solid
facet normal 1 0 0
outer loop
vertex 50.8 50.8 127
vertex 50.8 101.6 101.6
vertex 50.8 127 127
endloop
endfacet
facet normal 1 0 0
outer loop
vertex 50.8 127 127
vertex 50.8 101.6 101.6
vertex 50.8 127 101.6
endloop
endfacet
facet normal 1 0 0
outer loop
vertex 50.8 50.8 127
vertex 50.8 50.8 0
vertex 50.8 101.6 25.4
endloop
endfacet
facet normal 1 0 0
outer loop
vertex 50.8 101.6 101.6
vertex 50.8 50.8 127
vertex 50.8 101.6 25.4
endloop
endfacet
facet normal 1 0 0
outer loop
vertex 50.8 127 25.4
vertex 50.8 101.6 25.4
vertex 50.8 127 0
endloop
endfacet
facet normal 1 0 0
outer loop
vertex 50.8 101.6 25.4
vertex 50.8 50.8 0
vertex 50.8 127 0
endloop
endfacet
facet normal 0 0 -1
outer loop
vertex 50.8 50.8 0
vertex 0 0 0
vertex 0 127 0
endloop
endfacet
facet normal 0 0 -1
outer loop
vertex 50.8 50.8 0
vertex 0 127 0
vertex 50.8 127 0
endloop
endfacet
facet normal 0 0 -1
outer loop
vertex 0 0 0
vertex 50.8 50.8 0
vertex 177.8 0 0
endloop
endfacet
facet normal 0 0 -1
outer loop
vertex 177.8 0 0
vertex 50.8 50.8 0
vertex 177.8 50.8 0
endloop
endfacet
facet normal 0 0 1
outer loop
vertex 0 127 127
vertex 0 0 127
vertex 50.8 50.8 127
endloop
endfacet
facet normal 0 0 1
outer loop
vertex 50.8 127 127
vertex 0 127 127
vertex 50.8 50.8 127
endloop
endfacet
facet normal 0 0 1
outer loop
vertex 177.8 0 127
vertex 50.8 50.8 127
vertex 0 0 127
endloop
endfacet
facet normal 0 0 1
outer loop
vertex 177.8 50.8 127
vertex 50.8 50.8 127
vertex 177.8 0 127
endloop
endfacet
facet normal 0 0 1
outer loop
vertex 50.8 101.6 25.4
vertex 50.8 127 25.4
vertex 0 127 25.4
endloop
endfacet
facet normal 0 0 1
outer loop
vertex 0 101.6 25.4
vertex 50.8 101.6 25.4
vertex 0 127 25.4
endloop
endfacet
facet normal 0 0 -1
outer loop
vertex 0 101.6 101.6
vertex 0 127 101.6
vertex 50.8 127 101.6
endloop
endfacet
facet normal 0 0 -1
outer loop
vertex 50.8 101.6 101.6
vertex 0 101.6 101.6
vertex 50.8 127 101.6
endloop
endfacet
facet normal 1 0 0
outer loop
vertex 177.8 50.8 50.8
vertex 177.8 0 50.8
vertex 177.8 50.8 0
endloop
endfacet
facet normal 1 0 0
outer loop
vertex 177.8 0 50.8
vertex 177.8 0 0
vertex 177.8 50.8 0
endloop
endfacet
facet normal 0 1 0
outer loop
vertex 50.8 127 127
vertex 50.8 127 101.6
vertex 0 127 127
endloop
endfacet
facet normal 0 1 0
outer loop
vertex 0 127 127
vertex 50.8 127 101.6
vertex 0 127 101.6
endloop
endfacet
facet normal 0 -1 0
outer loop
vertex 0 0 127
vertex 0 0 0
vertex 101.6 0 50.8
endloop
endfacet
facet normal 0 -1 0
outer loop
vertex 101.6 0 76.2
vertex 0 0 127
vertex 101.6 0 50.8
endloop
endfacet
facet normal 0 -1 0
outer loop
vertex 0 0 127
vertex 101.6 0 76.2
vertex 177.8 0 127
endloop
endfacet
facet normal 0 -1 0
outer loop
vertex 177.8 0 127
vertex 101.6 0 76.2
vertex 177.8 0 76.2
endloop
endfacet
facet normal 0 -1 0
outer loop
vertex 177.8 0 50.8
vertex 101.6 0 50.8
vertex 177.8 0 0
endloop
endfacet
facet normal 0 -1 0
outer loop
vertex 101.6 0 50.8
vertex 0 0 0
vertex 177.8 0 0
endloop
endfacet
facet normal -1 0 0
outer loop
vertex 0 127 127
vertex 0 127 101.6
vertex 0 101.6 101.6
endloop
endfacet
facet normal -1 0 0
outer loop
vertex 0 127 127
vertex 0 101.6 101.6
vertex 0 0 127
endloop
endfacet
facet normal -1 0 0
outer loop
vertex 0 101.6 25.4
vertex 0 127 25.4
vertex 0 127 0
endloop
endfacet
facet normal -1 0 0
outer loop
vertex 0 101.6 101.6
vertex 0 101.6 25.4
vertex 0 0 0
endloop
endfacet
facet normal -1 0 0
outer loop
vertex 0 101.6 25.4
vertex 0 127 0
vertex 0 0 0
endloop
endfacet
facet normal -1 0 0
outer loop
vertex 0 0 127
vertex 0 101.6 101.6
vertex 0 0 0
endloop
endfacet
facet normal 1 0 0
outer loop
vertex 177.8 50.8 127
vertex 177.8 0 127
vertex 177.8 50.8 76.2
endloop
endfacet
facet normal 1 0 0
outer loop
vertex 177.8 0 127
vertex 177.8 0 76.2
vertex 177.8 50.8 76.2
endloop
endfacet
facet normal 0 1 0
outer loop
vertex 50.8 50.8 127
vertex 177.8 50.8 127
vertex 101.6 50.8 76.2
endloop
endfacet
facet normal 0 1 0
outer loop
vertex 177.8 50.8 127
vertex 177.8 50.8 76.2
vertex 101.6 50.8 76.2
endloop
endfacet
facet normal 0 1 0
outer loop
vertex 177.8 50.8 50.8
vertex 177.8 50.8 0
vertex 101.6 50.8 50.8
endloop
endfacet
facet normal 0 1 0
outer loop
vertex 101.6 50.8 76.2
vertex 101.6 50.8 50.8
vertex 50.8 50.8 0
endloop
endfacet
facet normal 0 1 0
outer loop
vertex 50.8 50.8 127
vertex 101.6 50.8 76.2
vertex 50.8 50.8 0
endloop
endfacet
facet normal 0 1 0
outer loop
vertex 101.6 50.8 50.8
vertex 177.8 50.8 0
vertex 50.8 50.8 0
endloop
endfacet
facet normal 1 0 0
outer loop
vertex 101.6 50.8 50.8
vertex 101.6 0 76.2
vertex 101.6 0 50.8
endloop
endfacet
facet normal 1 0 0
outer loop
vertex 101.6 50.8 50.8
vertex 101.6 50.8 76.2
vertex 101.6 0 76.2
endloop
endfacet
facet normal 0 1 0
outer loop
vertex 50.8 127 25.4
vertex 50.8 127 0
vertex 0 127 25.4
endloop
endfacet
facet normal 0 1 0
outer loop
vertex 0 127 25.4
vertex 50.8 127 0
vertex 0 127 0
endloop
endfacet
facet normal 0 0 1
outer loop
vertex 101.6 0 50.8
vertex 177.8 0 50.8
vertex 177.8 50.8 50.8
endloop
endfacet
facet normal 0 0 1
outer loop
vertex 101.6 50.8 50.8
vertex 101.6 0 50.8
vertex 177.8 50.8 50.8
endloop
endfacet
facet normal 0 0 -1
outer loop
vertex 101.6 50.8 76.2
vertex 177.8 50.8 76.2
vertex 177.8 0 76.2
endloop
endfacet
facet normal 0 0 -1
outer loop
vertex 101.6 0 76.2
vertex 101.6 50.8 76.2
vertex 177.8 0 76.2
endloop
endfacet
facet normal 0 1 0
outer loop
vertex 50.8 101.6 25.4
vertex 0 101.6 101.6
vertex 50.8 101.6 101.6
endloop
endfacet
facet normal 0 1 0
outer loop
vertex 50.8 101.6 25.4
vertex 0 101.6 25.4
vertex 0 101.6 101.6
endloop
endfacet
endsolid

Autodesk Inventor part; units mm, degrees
ref_plane "YZ Plane" through (0, 0, 0) normal (1, 0, 0) x (0, 1, 0)
ref_plane "XZ Plane" through (0, 0, 0) normal (0, 1, 0) x (-1, 0, 0)
ref_plane "XY Plane" through (0, 0, 0) normal (0, 0, 1) x (1, 0, 0)
sketch "Sketch1" plane through (0, 0, 0) normal (0, 0, 1) x (1, 0, 0)
  line L0 (0, 0) -> (9.2453, 0)
  line L1 (0, 0) -> (177.8, 0)
  line L2 (177.8, 0) -> (177.8, 50.8)
  line L3 (177.8, 50.8) -> (50.8, 50.8)
  line L4 (50.8, 50.8) -> (50.8, 127)
  line L5 (50.8, 127) -> (0, 127)
  line L6 (0, 127) -> (0, 0)
  dimension "d0" = 177.8
  dimension "d1" = 50.8
  dimension "d2" = 127
  dimension "d3" = 76.2
  dimension "d4" = 50.8
extrude "Extrusion1" add sketch "Sketch1" along normal blind 127
sketch "Sketch2" plane through (177.8, 0, 0) normal (1, 0, 0) x (0, 0, -1)
  line L0 (0, 50.8) -> (-127, 50.8) projected
  line L1 (-63.5, 50.8) -> (-50.8, 50.8)
  line L2 (-50.8, 50.8) -> (-76.2, 50.8)
  line L3 (-76.2, 50.8) -> (-76.2, 0)
  line L4 (-76.2, 0) -> (-50.8, 0)
  line L5 (-50.8, 0) -> (-50.8, 50.8)
  point P0 (0, 0)
  dimension "d7" = 12.7
  dimension "d8" = 25.4
  dimension "d9" = 50.8
extrude "Extrusion2" cut sketch "Sketch2" against normal blind 76.2
sketch "Sketch3" plane through (0, 127, 0) normal (0, 1, 0) x (1, 0, 0)
  line L0 (0, 0) -> (0, -127) projected
  line L1 (0, -63.5) -> (0, -101.6)
  line L2 (0, -101.6) -> (50.8, -101.6)
  line L3 (50.8, -101.6) -> (50.8, -25.4)
  line L4 (50.8, -25.4) -> (0, -25.4)
  line L5 (0, -25.4) -> (0, -101.6)
  dimension "d12" = 38.1
  dimension "d13" = 50.8
  dimension "d14" = 76.2
extrude "Extrusion3" cut sketch "Sketch3" against normal blind 25.4
properties part number "10-18-19 A"
